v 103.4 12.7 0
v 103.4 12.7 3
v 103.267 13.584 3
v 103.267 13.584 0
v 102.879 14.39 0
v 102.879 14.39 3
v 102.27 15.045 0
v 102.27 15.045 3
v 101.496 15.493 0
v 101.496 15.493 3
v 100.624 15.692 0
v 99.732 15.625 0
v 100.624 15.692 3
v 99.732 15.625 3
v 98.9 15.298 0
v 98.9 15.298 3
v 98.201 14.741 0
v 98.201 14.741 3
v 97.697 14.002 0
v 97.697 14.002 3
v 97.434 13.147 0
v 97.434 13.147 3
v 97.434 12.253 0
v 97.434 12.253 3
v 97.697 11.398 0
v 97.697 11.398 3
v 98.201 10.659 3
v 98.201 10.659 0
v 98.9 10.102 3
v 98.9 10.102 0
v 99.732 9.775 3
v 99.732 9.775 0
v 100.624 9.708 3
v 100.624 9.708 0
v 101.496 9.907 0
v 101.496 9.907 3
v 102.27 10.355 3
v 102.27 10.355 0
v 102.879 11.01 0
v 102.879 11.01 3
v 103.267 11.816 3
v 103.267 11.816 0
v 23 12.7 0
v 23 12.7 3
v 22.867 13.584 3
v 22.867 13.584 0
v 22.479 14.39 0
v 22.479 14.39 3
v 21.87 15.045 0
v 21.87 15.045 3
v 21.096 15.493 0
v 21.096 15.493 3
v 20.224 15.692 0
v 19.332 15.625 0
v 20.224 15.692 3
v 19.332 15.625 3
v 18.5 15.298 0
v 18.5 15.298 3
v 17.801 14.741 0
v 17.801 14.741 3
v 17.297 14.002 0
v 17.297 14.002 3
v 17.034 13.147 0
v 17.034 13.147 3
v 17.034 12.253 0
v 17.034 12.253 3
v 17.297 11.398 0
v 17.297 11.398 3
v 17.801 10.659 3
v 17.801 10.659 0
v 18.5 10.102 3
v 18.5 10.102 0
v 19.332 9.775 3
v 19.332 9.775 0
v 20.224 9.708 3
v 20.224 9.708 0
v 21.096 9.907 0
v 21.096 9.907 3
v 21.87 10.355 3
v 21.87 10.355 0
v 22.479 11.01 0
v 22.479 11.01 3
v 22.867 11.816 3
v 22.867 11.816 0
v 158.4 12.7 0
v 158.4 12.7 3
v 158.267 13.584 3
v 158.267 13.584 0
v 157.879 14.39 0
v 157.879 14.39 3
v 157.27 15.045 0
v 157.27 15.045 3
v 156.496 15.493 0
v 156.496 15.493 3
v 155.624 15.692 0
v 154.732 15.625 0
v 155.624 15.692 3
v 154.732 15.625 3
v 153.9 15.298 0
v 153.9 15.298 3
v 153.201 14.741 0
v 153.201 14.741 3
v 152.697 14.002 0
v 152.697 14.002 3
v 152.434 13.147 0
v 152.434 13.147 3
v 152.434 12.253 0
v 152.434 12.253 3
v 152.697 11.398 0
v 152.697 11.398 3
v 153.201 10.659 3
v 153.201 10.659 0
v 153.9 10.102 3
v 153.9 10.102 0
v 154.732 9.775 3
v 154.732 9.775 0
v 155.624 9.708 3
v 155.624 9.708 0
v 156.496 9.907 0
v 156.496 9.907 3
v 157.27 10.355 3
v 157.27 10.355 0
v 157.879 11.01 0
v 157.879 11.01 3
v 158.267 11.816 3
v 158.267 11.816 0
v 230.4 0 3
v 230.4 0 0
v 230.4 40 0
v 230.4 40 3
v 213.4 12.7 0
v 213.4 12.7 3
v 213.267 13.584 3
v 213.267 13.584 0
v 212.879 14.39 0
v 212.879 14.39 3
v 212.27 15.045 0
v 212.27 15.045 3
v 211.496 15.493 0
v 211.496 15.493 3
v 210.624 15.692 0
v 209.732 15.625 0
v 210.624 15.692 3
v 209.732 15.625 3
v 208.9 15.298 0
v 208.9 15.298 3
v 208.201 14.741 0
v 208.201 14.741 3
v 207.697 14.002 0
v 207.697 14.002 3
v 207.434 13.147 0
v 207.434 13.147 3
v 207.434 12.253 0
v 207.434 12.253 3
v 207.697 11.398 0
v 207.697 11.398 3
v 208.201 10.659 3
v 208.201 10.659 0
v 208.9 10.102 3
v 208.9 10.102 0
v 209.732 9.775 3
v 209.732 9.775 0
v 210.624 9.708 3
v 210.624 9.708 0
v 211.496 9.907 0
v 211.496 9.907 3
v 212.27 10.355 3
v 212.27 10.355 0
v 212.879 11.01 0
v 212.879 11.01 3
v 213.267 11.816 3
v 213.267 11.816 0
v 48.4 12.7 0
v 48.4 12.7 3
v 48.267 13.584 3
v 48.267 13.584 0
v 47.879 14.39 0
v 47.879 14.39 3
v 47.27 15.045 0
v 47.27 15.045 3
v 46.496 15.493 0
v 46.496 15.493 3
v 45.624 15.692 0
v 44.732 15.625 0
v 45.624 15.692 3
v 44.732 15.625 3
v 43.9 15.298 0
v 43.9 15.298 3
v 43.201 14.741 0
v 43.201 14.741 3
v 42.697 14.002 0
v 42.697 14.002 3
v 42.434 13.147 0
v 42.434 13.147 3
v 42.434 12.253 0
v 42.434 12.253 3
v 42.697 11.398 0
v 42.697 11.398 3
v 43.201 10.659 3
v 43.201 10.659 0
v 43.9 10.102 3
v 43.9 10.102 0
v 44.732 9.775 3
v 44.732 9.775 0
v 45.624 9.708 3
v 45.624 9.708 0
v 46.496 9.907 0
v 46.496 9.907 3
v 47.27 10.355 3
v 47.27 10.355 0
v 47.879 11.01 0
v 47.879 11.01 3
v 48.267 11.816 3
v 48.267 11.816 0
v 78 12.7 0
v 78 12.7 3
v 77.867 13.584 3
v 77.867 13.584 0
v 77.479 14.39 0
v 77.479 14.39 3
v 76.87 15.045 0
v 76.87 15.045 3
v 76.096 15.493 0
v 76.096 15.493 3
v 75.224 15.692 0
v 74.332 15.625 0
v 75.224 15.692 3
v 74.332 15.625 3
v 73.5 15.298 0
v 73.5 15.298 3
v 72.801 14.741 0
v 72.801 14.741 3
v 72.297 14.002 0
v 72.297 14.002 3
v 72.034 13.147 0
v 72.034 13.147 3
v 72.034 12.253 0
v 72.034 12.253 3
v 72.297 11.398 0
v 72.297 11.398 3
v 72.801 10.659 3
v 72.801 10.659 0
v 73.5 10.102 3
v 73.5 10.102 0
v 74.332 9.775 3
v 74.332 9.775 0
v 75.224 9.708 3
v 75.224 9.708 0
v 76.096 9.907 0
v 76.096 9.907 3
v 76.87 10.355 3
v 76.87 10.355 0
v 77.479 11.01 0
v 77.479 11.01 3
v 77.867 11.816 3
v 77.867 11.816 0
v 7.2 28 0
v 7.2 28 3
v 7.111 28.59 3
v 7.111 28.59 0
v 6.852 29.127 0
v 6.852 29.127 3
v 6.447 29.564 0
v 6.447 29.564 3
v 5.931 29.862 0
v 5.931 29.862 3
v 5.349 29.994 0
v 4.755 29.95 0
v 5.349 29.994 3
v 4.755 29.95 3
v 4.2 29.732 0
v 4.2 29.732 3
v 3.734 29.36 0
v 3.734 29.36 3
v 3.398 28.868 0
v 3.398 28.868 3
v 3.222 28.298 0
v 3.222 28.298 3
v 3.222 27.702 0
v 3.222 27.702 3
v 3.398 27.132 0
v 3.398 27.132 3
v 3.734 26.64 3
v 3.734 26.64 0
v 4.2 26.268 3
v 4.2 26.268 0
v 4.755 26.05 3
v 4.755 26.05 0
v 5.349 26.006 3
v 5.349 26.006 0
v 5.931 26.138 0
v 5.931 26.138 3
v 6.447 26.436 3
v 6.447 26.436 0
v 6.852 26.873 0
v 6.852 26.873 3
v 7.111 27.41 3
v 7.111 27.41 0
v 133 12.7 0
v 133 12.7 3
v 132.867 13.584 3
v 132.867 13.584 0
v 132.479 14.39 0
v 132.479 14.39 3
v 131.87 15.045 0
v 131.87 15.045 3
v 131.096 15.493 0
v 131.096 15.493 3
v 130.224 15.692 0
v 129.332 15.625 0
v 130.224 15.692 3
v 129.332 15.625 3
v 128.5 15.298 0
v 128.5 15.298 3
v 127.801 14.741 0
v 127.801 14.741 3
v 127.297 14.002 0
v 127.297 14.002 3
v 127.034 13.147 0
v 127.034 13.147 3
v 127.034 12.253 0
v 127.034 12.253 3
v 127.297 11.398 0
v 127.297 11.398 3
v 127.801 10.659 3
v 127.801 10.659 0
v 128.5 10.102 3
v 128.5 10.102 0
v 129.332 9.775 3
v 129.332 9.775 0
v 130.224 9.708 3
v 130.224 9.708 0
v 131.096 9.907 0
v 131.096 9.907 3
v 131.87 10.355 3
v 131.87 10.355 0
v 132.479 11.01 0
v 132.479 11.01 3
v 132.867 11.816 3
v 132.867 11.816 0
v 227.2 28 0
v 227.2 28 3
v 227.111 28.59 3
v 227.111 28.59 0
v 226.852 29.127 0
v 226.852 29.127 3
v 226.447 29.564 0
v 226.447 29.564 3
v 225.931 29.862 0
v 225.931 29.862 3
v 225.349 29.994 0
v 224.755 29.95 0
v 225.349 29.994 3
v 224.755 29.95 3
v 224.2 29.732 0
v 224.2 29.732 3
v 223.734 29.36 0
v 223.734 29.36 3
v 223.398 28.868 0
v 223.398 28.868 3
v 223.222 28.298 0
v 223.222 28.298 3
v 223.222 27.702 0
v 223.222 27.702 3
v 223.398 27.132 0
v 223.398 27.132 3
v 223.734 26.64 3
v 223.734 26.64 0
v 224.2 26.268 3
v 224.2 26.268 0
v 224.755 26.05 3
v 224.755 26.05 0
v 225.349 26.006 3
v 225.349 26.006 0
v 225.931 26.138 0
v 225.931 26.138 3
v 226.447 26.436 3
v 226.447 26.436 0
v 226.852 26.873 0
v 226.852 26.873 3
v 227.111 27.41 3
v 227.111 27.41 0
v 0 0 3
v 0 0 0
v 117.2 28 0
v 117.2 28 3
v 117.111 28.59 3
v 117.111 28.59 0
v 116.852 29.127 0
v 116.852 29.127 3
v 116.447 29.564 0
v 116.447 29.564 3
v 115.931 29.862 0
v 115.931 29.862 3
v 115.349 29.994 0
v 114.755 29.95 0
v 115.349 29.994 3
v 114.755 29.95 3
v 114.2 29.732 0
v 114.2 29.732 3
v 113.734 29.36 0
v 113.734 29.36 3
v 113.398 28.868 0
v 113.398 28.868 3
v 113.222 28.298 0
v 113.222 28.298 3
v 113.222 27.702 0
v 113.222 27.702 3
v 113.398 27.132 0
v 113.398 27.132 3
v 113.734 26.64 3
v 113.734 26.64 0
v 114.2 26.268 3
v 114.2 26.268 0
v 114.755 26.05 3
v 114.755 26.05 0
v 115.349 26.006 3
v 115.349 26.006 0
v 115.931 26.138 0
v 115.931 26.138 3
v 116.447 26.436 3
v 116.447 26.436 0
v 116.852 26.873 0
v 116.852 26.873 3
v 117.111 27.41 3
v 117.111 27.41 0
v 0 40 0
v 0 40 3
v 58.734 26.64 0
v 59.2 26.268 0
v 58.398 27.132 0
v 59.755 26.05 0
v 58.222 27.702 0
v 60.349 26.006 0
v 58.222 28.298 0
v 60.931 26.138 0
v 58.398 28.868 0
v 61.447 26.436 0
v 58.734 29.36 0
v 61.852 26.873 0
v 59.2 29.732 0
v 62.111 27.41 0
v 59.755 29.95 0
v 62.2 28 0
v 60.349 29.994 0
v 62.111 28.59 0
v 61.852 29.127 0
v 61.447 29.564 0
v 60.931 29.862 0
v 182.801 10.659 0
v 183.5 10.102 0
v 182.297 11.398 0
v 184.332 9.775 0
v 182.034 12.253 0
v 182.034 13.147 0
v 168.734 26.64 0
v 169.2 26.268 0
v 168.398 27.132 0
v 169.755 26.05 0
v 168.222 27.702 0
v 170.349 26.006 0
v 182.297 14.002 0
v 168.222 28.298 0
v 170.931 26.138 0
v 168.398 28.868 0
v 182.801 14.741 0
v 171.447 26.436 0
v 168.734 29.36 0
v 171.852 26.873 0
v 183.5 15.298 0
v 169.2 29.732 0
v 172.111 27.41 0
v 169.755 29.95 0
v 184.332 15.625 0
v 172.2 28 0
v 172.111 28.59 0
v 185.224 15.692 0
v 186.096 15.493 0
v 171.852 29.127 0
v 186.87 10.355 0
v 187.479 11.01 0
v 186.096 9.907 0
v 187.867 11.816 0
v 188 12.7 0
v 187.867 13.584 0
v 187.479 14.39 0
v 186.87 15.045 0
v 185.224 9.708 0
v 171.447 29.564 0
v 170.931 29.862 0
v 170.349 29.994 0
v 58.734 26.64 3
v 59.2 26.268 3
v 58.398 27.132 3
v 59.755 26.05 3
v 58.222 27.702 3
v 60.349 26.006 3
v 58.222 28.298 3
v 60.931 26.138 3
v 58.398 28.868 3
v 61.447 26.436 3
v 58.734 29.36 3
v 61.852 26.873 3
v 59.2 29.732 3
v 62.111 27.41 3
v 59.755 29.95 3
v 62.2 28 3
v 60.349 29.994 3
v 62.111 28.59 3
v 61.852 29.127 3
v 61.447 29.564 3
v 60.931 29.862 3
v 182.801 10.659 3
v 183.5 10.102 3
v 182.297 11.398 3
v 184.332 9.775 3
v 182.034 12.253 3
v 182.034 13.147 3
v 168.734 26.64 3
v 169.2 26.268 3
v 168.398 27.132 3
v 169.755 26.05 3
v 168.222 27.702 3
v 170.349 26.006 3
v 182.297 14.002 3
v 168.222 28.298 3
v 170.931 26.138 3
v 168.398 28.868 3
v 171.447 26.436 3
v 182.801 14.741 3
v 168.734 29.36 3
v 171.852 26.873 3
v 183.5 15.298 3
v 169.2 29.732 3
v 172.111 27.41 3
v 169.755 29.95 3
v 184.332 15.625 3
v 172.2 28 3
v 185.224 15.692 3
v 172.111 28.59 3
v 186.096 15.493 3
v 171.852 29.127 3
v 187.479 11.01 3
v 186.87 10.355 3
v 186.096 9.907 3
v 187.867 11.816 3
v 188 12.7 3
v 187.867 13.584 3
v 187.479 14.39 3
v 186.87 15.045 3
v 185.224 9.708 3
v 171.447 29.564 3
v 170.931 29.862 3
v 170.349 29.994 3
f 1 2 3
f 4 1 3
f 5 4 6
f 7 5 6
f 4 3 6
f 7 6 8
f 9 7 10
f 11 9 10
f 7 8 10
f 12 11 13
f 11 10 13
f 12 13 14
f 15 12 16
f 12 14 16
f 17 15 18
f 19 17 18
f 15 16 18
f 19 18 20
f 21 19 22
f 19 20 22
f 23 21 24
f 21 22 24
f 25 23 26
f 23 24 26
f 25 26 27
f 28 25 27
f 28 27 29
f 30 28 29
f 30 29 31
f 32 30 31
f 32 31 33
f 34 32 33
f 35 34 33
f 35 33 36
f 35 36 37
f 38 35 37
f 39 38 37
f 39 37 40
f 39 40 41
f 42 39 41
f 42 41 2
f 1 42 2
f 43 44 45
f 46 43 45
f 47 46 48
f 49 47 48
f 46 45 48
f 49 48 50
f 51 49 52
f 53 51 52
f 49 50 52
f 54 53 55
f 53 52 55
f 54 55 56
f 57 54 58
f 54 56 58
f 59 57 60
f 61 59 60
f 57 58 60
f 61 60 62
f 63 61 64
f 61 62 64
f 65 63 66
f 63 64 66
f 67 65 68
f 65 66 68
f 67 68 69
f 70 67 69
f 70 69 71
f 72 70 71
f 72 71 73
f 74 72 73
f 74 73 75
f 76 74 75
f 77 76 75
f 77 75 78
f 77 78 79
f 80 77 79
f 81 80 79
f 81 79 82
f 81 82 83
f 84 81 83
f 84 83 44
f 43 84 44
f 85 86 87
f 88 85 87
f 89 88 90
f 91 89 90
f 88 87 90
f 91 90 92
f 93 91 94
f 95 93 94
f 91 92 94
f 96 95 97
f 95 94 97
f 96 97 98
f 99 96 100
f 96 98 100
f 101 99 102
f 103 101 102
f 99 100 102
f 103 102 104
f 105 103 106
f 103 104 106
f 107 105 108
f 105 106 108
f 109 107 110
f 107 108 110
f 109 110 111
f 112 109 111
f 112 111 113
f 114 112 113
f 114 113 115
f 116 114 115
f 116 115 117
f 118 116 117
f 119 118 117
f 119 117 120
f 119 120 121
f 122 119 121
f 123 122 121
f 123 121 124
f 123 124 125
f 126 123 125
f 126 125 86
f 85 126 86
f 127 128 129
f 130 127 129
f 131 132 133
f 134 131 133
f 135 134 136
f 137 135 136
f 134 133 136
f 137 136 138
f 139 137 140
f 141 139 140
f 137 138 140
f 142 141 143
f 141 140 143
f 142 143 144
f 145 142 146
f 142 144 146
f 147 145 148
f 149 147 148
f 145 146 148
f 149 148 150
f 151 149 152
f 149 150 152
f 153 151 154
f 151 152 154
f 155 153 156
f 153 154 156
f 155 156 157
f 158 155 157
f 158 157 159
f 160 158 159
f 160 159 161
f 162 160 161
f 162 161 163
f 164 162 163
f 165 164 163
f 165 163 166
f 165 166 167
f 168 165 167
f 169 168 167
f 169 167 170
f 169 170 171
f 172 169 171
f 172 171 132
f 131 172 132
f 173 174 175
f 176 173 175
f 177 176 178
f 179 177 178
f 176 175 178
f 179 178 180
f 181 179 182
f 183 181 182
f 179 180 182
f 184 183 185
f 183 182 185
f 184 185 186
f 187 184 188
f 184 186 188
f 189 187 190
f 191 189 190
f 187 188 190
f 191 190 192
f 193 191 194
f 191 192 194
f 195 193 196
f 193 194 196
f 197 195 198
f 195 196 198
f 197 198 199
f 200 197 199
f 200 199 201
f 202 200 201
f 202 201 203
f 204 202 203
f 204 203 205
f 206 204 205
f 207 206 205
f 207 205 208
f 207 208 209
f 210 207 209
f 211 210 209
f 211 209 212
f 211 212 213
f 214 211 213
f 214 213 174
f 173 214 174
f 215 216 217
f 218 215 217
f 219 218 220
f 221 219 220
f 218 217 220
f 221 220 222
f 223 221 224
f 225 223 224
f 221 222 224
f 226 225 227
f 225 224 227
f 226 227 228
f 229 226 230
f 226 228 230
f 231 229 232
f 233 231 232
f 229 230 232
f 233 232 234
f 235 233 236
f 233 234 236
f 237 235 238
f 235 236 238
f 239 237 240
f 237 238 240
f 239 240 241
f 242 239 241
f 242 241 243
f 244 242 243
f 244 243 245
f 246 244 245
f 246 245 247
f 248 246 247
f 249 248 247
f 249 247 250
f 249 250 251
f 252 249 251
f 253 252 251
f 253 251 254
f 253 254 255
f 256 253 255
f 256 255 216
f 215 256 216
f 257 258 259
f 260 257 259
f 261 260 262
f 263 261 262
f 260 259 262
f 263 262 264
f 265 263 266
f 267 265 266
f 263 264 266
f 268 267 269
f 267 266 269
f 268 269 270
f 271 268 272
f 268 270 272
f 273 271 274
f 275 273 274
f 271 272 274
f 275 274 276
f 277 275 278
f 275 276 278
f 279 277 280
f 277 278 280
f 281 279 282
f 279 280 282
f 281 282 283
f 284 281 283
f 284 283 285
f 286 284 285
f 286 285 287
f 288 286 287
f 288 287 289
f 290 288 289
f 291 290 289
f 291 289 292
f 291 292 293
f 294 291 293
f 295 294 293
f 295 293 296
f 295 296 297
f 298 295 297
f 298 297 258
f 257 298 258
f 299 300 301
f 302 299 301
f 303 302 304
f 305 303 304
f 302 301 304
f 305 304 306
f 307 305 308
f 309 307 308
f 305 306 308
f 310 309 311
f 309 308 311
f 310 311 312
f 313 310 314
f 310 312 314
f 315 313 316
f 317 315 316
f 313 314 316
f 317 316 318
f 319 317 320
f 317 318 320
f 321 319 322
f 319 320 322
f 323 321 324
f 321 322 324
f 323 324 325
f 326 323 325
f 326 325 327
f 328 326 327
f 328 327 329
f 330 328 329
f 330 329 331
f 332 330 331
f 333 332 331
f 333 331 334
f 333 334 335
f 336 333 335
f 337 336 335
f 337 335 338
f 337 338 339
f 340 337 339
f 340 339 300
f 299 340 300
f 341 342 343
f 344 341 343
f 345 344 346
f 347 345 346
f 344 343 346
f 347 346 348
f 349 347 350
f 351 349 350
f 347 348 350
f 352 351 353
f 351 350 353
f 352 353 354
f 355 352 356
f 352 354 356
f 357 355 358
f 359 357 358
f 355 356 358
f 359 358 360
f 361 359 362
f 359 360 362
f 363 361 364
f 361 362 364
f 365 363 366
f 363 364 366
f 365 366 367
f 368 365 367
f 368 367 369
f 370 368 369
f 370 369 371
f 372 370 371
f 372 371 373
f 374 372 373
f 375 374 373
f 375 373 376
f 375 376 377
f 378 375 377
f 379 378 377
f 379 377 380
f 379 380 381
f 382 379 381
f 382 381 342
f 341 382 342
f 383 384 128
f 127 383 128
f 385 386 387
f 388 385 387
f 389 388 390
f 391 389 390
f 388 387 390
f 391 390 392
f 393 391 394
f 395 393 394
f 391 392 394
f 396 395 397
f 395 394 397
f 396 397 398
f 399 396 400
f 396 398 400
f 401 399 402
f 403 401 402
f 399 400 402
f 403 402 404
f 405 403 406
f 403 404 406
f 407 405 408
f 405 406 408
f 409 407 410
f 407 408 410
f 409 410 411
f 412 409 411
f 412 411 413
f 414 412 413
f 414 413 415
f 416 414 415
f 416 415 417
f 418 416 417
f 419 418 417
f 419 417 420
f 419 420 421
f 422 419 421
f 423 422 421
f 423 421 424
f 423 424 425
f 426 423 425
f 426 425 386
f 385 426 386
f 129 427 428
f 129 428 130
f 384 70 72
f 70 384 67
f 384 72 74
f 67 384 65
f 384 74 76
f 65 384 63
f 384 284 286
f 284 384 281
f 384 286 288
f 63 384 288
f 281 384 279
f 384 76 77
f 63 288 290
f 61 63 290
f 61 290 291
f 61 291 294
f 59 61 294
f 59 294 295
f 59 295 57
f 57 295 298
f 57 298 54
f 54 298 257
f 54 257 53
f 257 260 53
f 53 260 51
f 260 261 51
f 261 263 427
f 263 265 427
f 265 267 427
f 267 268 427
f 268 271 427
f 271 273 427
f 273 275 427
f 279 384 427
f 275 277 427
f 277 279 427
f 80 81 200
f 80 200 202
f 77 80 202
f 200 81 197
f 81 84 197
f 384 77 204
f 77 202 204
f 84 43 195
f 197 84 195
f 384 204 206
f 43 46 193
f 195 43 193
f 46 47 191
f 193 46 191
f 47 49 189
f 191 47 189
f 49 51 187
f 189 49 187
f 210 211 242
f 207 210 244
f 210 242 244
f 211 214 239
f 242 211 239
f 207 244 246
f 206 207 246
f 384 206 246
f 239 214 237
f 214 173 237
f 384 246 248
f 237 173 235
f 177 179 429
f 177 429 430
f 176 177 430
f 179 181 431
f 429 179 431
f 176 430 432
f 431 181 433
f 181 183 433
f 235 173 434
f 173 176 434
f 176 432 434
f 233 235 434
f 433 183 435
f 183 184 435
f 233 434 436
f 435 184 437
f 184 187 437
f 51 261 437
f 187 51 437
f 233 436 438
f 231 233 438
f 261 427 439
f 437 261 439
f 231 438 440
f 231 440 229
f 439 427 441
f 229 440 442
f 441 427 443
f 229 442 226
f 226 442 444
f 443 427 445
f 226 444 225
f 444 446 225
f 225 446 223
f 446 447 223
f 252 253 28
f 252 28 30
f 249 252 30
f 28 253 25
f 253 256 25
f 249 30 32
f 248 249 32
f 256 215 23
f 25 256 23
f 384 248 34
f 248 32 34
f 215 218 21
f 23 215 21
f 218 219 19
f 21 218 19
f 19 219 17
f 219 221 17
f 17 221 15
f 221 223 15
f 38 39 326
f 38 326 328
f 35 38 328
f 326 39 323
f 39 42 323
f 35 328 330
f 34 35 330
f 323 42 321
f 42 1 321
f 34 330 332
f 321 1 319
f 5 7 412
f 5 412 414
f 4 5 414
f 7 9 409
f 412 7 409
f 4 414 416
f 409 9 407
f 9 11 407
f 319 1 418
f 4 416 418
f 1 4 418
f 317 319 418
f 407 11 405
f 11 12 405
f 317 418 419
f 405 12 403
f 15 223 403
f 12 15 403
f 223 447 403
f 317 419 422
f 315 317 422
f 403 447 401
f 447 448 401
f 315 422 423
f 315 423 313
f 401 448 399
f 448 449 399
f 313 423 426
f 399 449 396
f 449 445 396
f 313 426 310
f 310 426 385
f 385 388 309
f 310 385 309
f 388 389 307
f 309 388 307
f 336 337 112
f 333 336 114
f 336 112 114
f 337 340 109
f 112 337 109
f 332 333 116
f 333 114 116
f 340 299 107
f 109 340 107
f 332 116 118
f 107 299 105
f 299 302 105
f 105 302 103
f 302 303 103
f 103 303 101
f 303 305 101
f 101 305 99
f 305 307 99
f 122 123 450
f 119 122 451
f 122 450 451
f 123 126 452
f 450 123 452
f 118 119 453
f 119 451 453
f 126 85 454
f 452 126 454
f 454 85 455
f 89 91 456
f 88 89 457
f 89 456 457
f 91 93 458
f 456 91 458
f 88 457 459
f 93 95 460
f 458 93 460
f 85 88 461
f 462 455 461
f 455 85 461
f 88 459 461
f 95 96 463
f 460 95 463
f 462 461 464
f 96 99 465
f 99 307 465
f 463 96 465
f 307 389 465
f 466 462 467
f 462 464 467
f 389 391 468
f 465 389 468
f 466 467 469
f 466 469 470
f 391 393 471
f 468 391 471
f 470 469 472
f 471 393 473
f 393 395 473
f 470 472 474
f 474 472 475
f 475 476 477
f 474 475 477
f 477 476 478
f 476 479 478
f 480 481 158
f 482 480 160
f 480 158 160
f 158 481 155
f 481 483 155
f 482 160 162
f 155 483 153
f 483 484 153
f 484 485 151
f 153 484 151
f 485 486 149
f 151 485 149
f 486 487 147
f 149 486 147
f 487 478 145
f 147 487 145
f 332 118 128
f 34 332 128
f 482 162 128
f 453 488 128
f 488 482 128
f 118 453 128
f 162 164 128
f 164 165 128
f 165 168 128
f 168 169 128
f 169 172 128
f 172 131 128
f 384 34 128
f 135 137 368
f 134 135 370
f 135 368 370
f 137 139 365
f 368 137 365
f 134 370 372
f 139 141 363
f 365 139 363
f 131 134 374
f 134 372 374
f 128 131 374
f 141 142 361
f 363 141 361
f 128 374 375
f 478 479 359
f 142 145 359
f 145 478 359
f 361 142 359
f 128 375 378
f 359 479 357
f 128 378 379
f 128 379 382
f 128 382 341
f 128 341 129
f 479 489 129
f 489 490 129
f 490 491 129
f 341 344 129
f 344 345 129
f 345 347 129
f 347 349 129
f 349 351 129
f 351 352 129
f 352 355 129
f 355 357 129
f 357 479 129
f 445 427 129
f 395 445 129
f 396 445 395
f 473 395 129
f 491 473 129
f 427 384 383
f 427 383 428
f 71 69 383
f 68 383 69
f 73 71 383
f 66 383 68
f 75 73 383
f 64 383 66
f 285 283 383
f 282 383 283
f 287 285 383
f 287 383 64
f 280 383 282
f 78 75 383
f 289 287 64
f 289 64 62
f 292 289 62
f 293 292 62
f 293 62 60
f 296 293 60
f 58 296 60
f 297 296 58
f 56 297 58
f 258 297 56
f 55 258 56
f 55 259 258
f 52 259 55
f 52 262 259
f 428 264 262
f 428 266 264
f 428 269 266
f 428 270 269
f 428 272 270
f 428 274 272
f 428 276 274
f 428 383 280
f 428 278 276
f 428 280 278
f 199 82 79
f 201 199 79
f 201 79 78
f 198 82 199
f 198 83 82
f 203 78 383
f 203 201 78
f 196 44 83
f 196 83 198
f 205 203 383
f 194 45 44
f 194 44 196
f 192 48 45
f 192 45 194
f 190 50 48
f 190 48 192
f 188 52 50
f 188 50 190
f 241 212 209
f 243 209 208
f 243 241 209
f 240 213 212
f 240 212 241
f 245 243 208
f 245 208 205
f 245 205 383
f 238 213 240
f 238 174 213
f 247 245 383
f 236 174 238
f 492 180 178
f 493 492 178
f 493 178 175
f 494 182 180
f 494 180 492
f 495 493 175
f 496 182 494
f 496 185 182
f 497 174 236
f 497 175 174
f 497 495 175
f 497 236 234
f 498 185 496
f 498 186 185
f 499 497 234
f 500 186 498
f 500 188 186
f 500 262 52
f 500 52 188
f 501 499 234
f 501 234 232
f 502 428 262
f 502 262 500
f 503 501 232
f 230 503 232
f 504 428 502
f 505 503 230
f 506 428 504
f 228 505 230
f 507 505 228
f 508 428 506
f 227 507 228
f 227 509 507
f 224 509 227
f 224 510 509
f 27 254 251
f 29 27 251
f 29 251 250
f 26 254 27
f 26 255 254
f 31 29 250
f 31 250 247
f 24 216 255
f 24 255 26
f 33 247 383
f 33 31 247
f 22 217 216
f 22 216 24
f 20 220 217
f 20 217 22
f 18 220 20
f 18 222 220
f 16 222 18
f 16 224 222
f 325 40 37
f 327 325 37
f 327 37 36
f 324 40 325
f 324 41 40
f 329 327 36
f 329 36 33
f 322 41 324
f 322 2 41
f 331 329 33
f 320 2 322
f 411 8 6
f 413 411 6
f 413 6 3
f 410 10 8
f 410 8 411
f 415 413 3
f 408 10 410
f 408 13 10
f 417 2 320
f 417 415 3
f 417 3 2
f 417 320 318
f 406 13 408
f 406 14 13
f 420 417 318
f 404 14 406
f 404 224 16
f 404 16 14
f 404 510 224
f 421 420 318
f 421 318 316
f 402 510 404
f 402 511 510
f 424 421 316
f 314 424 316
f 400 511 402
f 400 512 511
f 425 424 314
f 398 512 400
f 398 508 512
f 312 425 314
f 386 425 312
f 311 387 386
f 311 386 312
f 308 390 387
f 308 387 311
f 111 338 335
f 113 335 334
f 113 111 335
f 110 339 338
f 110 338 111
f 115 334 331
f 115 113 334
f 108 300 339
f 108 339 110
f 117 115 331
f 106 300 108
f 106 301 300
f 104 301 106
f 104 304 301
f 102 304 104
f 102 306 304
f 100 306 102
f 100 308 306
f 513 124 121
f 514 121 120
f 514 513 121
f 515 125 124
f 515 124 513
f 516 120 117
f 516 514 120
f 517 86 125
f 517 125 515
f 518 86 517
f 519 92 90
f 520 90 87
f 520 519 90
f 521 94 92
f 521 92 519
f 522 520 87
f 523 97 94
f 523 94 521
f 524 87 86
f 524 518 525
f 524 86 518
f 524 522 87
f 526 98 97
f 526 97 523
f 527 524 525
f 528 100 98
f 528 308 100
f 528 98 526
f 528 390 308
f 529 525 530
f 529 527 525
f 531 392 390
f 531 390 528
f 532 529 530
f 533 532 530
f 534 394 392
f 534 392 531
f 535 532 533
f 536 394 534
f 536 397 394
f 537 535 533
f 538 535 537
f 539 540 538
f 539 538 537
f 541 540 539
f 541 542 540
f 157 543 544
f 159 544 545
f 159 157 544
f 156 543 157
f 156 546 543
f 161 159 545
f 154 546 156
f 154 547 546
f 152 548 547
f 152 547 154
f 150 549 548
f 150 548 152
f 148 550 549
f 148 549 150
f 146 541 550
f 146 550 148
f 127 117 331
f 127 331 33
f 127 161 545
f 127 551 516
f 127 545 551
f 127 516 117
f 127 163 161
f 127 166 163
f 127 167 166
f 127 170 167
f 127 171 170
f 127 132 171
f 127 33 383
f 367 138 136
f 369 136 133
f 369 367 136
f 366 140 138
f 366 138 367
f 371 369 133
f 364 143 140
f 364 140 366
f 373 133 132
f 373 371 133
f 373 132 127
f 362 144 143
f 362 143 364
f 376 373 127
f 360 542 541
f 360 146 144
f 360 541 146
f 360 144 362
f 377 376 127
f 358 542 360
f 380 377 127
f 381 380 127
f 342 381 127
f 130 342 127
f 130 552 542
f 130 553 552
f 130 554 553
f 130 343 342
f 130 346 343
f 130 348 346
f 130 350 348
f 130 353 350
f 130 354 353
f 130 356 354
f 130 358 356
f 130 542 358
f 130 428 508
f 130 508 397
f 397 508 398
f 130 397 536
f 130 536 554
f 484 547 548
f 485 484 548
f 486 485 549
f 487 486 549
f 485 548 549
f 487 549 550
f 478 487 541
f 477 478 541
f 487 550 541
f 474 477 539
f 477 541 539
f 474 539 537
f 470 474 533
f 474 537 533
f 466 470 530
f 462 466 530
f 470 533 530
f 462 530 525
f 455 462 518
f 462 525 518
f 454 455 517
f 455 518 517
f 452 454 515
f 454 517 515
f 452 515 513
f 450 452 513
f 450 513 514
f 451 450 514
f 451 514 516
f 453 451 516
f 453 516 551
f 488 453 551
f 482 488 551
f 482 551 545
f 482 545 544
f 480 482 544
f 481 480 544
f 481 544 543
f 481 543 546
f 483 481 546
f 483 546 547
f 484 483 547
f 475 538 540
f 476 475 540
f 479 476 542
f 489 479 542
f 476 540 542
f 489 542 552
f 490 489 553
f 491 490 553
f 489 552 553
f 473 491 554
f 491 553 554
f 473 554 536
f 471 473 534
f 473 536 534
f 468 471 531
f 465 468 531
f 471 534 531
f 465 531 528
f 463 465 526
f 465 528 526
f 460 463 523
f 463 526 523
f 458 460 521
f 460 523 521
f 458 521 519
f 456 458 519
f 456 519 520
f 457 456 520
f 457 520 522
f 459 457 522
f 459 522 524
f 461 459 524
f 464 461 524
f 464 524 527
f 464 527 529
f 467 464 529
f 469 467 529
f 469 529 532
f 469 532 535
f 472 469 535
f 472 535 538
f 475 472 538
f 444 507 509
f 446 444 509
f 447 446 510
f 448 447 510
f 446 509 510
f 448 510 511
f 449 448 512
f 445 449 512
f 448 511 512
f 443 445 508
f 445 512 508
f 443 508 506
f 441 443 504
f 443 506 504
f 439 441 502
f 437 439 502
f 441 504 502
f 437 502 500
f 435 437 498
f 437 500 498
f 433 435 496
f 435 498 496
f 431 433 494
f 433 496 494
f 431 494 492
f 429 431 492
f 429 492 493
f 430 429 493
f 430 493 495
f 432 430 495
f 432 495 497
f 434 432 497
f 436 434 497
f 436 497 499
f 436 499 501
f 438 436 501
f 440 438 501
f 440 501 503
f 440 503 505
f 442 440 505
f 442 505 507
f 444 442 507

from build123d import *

# Parameters (mm, degrees)
F0_W     = 230.4
F0_H     = 40
F1_DEPTH = 3
F2_R     = 2
F3_DEPTH = 3.001
F4_R     = 3
F5_DEPTH = 3.001


with BuildPart() as f1:
    # F0 (on Top) → F1 (new body)
    with BuildSketch(Plane.XY):
        with Locations((115.2, 20)):
            Rectangle(F0_W, F0_H)
    extrude(amount=F1_DEPTH)

    # F2 (on face) → F3 (cut, through all)
    with BuildSketch(Plane.XY.offset(3)):
        with Locations((5.2, 28)):
            Circle(F2_R)
        with Locations((60.2, 28)):
            Circle(F2_R)
        with Locations((115.2, 28)):
            Circle(F2_R)
        with Locations((170.2, 28)):
            Circle(F2_R)
        with Locations((225.2, 28)):
            Circle(F2_R)
    extrude(amount=-F3_DEPTH, mode=Mode.SUBTRACT)

    # F4 (on face) → F5 (cut, through all)
    with BuildSketch(Plane.XY.offset(3)):
        with Locations((20, 12.7)):
            Circle(F4_R)
        with Locations((45.4, 12.7)):
            Circle(F4_R)
        with Locations((75, 12.7)):
            Circle(F4_R)
        with Locations((100.4, 12.7)):
            Circle(F4_R)
        with Locations((130, 12.7)):
            Circle(F4_R)
        with Locations((155.4, 12.7)):
            Circle(F4_R)
        with Locations((185, 12.7)):
            Circle(F4_R)
        with Locations((210.4, 12.7)):
            Circle(F4_R)
    extrude(amount=-F5_DEPTH, mode=Mode.SUBTRACT)


solid = f1.part
